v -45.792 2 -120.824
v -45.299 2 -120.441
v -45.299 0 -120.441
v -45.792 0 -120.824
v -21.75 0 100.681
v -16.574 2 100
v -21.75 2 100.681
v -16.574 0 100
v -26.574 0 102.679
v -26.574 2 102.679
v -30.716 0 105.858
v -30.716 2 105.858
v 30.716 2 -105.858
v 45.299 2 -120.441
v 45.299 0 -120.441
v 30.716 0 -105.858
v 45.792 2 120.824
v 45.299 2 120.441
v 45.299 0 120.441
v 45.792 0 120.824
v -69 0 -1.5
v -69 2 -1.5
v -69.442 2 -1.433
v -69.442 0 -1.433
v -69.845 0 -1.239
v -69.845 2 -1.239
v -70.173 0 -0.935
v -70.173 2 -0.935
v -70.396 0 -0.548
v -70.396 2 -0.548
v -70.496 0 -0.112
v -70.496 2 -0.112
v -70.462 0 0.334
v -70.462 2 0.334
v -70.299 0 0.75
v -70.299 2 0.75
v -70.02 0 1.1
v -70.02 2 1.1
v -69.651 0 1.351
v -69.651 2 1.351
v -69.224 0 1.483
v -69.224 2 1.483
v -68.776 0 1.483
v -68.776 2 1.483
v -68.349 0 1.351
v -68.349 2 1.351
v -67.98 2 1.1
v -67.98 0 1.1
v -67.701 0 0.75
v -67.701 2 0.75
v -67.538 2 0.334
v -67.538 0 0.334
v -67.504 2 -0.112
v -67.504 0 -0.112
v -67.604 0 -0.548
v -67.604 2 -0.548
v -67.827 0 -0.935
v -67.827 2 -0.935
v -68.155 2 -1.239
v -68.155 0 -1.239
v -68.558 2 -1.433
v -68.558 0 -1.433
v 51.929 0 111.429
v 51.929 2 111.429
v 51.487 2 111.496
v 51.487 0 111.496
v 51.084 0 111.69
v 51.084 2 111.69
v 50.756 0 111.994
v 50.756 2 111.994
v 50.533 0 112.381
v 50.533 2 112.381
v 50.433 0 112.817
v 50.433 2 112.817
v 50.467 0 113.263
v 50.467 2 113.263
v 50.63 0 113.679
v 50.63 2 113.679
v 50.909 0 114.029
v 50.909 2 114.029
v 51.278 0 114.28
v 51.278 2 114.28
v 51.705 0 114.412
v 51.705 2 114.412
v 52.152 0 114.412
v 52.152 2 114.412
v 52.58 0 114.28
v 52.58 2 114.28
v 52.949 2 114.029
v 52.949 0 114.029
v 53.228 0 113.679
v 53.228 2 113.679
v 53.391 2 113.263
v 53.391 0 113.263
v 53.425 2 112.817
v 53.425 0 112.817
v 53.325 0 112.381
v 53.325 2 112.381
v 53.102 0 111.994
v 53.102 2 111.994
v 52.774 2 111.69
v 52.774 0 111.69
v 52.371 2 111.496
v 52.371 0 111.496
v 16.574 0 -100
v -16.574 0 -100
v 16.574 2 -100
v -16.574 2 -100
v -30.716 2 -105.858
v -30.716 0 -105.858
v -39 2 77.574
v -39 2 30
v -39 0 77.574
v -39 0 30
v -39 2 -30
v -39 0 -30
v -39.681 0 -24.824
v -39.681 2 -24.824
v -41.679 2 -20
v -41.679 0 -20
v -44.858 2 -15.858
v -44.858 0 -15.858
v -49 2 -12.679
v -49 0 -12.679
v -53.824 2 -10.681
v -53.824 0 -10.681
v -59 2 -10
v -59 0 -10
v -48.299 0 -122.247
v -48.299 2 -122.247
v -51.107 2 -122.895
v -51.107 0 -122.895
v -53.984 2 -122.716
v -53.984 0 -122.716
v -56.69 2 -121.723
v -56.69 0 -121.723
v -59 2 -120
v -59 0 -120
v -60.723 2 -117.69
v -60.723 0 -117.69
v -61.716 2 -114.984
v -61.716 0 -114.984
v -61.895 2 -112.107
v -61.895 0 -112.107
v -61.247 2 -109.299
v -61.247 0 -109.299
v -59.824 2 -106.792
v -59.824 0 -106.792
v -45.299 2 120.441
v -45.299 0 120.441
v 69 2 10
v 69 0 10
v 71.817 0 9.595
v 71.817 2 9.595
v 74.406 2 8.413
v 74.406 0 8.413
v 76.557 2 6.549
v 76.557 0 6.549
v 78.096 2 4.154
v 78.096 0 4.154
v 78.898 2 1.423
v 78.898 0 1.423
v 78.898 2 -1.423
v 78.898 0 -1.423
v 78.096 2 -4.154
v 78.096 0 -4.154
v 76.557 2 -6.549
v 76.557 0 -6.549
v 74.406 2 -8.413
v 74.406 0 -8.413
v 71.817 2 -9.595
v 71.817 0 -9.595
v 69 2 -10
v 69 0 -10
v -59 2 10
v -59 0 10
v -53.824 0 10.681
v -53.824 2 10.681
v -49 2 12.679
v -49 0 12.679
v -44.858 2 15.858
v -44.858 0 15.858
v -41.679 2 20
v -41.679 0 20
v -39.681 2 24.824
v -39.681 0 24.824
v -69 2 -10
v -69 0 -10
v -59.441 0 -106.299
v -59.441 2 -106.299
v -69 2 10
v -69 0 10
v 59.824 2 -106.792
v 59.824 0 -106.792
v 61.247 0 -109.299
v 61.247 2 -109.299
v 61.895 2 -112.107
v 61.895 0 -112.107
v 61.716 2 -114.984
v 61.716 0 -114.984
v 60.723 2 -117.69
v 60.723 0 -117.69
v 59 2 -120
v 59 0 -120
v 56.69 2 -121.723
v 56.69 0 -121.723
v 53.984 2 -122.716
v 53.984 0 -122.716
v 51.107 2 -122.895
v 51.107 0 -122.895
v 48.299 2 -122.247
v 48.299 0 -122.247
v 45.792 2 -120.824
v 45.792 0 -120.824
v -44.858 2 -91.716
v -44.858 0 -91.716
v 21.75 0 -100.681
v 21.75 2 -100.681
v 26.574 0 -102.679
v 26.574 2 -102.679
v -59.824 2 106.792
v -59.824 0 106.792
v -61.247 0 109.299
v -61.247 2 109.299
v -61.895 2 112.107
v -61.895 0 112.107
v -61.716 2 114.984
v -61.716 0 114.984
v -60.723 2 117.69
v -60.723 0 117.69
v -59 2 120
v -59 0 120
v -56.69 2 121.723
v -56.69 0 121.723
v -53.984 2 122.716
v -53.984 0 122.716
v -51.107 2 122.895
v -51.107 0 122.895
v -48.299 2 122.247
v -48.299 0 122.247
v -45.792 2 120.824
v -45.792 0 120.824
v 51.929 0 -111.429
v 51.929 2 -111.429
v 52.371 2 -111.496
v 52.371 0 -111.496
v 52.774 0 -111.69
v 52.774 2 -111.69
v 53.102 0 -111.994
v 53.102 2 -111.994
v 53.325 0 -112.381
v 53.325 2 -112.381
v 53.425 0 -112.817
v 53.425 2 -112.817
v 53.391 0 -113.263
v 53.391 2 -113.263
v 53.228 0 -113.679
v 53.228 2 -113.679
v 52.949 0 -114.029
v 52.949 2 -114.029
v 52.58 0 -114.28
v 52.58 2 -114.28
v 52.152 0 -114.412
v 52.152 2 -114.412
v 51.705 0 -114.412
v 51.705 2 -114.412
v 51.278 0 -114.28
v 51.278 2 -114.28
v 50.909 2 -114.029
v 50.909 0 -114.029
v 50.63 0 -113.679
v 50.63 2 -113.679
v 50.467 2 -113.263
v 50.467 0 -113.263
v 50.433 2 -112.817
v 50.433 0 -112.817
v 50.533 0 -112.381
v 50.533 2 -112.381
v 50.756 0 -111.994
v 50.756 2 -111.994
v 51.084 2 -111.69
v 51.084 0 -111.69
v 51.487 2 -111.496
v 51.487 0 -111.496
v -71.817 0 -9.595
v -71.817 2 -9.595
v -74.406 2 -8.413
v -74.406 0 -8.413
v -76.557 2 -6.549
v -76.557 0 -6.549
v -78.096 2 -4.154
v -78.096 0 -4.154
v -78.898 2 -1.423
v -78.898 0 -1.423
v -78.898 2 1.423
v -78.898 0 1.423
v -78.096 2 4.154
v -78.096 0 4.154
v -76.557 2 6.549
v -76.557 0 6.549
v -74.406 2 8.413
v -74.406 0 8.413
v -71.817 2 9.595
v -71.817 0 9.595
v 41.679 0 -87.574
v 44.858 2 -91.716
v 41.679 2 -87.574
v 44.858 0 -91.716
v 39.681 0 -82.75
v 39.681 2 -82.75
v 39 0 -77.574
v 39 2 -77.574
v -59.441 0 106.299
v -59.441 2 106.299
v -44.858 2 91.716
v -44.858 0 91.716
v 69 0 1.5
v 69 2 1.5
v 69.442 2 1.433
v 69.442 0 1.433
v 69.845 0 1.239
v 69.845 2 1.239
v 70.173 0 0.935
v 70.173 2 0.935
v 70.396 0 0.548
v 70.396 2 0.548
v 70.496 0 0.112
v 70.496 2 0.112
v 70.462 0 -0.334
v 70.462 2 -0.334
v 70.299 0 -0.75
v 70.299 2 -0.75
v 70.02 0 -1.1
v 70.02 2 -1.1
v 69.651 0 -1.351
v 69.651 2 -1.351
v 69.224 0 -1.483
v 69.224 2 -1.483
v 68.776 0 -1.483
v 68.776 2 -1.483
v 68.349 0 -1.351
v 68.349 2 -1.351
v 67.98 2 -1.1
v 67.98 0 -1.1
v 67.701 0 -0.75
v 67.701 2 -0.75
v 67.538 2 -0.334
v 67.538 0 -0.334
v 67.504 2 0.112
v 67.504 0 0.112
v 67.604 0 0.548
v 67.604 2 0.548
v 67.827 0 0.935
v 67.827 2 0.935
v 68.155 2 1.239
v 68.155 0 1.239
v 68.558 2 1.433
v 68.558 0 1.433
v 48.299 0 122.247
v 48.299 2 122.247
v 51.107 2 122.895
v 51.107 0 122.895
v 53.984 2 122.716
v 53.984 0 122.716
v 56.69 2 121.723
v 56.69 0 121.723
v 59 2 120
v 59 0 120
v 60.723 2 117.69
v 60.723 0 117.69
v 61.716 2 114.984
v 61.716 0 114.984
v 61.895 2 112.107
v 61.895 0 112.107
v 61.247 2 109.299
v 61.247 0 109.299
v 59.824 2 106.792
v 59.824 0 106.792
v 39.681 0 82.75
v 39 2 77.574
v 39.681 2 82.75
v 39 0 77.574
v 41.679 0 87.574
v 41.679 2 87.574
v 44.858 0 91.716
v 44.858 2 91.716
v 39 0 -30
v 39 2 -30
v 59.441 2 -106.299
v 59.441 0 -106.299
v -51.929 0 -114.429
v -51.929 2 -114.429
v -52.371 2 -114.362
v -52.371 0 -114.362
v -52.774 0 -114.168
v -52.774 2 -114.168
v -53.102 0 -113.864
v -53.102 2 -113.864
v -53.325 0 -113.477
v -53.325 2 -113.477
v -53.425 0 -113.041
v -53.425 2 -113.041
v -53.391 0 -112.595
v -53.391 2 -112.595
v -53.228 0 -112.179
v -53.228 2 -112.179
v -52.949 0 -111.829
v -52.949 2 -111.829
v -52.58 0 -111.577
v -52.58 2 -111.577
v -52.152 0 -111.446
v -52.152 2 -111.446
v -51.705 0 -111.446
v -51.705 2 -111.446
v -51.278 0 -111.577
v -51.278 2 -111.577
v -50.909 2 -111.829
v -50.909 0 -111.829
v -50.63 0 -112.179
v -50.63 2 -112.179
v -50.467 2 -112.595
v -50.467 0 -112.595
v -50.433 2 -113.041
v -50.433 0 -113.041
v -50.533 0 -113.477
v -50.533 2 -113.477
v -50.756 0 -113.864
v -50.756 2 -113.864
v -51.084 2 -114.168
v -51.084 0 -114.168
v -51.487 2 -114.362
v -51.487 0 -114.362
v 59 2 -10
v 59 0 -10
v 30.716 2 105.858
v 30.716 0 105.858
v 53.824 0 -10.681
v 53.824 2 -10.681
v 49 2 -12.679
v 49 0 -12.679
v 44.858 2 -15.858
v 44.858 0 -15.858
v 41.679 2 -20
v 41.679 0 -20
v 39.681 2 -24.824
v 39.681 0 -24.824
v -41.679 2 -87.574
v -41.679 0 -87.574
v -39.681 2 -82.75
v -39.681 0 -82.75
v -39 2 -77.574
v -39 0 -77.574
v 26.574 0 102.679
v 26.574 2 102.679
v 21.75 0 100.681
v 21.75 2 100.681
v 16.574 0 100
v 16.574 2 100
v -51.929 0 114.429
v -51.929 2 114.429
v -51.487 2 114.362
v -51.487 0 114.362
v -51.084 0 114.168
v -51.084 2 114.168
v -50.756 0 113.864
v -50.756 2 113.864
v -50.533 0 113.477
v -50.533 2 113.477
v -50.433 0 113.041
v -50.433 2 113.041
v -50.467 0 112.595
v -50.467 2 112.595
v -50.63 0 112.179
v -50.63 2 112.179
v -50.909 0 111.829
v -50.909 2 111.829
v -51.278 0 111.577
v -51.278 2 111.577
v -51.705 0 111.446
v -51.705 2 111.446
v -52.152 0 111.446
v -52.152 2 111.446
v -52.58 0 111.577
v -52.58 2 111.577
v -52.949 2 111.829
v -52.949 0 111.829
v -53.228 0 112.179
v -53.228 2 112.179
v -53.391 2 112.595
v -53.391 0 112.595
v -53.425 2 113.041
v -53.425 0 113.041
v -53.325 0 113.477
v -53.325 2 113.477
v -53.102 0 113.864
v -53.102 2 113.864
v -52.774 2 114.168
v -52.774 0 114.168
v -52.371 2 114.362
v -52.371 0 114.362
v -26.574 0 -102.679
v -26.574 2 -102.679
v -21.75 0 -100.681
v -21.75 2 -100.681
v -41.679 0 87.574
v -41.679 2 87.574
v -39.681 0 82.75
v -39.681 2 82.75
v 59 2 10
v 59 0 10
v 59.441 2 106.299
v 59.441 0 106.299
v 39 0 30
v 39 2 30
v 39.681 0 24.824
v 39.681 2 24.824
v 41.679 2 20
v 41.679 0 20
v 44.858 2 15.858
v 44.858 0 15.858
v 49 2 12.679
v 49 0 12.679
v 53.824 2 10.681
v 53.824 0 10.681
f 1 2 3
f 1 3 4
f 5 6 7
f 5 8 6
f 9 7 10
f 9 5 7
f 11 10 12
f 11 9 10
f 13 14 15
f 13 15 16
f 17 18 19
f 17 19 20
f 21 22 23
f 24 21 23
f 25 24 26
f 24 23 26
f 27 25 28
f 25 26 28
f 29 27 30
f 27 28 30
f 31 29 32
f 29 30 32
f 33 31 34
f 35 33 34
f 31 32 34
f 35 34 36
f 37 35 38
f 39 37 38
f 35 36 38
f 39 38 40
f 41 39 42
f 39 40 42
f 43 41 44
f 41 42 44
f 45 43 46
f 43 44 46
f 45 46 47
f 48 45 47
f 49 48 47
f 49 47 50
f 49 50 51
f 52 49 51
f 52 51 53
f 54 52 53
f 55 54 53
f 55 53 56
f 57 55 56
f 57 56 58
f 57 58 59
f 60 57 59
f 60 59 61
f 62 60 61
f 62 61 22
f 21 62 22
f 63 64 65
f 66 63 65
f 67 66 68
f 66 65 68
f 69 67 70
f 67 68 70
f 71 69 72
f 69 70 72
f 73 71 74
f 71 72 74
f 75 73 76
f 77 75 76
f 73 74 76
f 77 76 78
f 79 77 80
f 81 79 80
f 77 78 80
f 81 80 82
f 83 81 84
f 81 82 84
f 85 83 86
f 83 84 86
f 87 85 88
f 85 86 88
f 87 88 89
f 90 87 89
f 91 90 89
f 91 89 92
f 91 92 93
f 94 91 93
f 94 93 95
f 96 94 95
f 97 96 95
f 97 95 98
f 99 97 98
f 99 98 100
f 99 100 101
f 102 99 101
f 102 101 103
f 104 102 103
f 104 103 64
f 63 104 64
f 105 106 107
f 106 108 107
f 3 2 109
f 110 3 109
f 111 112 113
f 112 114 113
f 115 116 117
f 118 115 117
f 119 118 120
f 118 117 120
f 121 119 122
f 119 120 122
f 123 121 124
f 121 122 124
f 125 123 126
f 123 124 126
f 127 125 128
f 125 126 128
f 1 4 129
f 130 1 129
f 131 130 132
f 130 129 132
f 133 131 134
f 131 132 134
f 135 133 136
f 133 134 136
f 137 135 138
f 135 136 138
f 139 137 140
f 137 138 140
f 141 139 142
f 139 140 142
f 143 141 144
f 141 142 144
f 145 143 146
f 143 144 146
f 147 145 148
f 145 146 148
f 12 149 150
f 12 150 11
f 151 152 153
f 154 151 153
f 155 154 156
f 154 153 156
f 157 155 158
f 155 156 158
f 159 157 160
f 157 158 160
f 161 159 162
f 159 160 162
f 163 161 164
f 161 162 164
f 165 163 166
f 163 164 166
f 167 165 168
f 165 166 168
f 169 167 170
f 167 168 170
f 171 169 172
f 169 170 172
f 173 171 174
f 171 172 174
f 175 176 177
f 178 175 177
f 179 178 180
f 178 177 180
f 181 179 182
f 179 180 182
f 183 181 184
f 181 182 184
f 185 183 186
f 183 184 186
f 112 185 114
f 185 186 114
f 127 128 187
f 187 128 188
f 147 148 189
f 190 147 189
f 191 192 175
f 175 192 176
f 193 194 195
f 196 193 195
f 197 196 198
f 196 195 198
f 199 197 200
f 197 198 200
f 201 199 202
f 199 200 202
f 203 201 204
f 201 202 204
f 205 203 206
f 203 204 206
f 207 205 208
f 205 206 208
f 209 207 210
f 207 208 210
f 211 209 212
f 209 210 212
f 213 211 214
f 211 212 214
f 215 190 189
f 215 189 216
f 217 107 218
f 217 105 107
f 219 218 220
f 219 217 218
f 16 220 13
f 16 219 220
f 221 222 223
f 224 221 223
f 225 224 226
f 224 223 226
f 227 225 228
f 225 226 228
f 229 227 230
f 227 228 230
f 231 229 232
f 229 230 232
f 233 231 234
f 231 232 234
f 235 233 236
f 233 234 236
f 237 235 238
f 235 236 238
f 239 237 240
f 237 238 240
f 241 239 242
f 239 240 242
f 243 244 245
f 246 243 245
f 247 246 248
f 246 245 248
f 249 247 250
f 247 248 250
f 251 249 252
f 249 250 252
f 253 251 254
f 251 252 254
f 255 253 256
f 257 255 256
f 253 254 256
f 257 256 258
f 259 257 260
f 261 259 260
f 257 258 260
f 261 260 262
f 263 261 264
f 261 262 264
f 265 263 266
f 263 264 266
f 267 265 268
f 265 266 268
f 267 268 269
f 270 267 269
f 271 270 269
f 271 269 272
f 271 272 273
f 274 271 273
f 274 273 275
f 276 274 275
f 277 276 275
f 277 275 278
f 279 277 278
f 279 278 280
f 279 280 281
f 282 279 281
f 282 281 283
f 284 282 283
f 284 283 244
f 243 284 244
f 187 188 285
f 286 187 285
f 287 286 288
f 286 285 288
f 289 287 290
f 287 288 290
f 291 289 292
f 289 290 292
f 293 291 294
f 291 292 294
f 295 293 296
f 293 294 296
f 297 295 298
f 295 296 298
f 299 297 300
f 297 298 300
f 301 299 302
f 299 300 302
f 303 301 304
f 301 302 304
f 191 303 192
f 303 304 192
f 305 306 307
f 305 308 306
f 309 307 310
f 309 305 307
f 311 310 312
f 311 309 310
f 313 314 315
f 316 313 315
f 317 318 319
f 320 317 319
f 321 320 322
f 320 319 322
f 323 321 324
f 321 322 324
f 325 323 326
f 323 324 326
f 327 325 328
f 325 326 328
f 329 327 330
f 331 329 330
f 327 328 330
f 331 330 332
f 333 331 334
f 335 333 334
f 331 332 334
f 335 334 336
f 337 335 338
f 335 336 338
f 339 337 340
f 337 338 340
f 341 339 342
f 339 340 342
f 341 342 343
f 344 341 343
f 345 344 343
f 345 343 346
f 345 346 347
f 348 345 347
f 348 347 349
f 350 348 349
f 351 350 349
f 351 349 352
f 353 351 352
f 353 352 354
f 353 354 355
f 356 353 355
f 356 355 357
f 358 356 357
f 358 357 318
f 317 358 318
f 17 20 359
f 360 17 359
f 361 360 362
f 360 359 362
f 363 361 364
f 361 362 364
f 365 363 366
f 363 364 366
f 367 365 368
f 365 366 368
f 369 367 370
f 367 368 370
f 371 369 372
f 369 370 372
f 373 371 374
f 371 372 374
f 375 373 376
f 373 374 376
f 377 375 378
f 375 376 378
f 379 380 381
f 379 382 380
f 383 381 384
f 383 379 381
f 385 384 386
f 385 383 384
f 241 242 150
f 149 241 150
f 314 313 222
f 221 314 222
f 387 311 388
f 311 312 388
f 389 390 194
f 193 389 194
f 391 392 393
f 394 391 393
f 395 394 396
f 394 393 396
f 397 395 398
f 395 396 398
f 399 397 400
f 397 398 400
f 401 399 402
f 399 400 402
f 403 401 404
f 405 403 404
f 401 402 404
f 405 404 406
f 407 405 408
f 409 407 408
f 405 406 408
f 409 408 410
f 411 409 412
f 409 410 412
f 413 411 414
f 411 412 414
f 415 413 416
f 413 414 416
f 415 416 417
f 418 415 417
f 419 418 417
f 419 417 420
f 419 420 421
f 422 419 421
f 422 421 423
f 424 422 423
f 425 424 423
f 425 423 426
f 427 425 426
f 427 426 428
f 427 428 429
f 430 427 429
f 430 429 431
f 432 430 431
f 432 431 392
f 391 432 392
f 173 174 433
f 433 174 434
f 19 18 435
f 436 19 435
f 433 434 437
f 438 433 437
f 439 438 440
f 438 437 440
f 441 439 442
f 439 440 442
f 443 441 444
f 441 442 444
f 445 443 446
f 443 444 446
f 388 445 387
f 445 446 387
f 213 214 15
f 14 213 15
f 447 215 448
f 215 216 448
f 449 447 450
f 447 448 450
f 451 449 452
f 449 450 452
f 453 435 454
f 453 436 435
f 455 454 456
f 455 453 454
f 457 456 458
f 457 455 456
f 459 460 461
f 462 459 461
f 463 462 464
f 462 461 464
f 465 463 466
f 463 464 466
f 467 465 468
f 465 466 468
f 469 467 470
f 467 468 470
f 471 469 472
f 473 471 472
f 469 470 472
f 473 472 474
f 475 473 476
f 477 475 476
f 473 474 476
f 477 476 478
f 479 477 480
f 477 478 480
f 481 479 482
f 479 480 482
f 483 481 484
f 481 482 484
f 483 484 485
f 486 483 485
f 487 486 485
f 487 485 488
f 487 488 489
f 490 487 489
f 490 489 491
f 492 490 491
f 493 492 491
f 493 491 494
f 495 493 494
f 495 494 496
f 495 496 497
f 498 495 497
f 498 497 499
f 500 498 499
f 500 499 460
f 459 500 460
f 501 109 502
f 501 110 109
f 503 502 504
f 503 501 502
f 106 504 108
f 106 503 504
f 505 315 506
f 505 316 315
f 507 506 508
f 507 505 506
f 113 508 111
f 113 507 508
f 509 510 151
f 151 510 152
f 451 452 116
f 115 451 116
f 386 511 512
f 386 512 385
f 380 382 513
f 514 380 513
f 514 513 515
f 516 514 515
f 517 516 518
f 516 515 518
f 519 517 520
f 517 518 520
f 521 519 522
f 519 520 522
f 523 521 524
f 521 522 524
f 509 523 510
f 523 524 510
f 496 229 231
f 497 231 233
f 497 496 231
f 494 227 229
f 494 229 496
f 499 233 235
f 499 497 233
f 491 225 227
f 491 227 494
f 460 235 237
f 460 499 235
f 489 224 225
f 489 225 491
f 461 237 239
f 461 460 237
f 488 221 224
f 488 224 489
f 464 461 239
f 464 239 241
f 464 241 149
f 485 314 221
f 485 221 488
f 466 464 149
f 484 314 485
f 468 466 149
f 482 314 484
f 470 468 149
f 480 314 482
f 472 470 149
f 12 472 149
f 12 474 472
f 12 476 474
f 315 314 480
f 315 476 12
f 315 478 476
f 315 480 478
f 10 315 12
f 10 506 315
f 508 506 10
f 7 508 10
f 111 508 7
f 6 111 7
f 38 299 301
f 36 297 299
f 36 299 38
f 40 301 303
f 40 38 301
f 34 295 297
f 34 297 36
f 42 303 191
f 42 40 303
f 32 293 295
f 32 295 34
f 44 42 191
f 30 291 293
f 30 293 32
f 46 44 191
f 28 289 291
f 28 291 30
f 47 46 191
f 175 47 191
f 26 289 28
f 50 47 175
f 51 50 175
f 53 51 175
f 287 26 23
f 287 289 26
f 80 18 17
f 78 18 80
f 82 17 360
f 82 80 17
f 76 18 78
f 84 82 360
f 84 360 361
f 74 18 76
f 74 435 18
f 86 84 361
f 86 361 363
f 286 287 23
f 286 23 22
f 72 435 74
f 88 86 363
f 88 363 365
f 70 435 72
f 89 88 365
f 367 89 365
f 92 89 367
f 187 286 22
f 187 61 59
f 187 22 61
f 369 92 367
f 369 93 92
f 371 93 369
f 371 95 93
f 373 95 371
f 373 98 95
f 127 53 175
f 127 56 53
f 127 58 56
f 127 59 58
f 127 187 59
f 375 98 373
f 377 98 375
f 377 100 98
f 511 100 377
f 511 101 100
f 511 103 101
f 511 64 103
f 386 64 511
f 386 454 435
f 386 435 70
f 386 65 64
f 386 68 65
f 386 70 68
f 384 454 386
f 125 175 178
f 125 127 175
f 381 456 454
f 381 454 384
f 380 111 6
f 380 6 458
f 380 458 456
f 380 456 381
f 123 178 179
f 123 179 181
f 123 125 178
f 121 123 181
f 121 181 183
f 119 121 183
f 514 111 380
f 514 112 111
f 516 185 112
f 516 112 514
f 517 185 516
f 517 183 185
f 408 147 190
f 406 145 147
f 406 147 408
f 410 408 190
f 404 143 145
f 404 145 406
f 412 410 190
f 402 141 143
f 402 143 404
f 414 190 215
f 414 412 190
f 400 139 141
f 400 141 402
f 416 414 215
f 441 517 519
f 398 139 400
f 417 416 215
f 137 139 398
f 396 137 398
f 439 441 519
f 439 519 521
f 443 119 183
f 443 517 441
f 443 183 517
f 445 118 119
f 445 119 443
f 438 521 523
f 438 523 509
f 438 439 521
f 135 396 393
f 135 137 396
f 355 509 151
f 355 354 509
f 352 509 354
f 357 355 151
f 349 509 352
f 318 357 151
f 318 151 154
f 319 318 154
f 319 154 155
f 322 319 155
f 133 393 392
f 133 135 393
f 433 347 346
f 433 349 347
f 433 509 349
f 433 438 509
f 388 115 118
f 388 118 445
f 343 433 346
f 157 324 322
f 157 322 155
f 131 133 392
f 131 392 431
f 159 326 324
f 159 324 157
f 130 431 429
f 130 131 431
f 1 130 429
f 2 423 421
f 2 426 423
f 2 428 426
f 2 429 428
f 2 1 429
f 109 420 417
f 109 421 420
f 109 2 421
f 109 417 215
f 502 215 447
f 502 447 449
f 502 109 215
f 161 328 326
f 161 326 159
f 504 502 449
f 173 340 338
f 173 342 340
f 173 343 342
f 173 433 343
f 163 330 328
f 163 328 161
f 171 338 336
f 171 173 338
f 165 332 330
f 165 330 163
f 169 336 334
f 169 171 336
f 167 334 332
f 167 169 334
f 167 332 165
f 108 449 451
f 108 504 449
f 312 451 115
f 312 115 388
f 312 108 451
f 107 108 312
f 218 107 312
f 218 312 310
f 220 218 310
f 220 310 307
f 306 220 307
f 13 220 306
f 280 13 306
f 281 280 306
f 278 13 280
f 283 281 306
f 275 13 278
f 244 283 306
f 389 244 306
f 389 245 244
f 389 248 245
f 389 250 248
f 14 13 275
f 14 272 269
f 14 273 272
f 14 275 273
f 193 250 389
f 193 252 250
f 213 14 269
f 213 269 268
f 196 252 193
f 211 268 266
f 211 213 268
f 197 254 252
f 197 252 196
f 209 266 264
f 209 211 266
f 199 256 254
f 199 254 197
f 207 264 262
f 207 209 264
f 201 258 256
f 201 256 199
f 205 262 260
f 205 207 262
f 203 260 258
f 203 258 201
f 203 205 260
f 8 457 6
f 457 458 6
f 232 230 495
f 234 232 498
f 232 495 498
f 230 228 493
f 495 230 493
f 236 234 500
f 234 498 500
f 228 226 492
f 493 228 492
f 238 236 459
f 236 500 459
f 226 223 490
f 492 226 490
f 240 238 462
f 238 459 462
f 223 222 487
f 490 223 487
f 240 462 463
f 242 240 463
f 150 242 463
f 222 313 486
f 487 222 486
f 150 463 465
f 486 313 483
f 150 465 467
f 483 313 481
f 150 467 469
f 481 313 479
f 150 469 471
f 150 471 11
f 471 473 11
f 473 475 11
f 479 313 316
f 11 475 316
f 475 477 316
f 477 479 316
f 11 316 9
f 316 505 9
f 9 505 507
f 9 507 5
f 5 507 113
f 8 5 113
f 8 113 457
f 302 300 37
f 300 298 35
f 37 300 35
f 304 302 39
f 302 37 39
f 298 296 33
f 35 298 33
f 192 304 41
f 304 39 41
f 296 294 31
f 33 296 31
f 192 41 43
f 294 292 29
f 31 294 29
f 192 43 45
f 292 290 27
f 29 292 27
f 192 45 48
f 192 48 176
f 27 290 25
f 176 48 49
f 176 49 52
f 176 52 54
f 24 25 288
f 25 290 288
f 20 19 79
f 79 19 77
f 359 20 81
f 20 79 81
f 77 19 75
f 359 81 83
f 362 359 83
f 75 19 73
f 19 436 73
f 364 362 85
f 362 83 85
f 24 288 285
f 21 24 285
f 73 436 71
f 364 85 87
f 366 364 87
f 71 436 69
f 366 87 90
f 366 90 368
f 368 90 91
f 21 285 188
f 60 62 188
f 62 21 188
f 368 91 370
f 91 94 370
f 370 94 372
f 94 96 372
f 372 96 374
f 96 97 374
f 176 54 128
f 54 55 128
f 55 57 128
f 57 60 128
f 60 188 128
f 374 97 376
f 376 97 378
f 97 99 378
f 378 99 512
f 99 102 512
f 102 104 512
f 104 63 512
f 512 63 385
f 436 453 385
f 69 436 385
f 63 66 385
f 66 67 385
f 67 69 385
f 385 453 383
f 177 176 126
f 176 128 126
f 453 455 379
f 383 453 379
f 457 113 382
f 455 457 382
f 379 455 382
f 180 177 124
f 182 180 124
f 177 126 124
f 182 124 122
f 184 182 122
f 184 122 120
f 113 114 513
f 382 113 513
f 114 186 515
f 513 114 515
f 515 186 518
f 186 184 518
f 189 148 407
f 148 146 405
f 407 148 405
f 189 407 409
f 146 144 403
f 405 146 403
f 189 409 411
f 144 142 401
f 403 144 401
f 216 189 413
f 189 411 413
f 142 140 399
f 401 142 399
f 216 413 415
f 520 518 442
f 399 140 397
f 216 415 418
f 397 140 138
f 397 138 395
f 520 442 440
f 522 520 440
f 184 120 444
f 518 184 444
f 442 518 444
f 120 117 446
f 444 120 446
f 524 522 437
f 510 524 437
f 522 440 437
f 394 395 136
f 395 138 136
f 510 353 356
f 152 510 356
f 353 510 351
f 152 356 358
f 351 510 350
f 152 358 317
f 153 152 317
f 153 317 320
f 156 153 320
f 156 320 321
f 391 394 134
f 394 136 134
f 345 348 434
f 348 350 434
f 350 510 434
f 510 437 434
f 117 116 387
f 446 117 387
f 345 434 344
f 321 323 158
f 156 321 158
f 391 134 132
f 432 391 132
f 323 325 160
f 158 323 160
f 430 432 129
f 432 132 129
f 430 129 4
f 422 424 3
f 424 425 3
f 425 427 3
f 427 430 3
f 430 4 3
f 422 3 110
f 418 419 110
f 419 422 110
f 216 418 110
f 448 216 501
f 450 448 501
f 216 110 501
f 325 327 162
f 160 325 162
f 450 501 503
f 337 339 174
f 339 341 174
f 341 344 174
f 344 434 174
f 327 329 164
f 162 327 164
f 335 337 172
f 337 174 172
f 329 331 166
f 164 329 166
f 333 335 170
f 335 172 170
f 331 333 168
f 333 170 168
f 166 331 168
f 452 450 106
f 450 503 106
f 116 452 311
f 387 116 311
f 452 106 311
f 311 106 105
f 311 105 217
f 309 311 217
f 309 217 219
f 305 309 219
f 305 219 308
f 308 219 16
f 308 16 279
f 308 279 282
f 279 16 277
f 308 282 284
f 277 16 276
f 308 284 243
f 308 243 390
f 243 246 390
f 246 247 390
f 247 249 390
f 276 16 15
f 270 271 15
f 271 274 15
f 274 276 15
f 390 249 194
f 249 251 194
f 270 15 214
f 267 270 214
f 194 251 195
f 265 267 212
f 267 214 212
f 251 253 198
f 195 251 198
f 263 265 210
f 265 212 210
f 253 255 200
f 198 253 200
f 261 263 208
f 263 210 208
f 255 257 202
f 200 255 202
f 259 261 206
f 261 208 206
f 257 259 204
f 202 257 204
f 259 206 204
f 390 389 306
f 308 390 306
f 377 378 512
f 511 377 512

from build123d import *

# Parameters (mm, degrees)
EXTRUDE_1_DEPTH       = 2
CUT_EXTRUDE_1_DEPTH   = 147.138709345
MIRROR_2_COPY_1_DEPTH = 147.138709345
FILLET_1_R            = 20
SKETCH_4_R            = 1.5
CUT_EXTRUDE_2_DEPTH   = 147.138709345


with BuildPart() as part:
    # 草图2 → 凸台-拉伸1 (new body)
    with BuildSketch(Plane(origin=(0, 0, 0), x_dir=(1, 0, 0), z_dir=(0, 1, 0))):
        with BuildLine():
            Line((-69, -10), (-59, -10))
            ThreePointArc((-59, -10), (-44.857864376, -15.857864376), (-39, -30))
            Line((-39, -30), (-39, -73.141444367))
            ThreePointArc((-39, -73.141444367), (-40.081491111, -79.629126652), (-43.209002143, -85.415171865))
            Line((-43.209002143, -85.415171865), (-59.824431116, -106.792068439))
            ThreePointArc((-59.824431116, -106.792068439), (-59, -120), (-45.792068439, -120.824431116))
            Line((-45.792068439, -120.824431116), (-24.415171865, -104.209002143))
            ThreePointArc((-24.415171865, -104.209002143), (-18.629126652, -101.081491111), (-12.141444367, -100))
            Line((-12.141444367, -100), (12.141444367, -100))
            ThreePointArc((12.141444367, -100), (18.629126652, -101.081491111), (24.415171865, -104.209002143))
            Line((24.415171865, -104.209002143), (45.792068439, -120.824431116))
            ThreePointArc((45.792068439, -120.824431116), (59, -120), (59.824431116, -106.792068439))
            Line((59.824431116, -106.792068439), (43.209002143, -85.415171865))
            ThreePointArc((43.209002143, -85.415171865), (40.081491111, -79.629126652), (39, -73.141444367))
            Line((39, -73.141444367), (39, -30))
            ThreePointArc((39, -30), (44.857864376, -15.857864376), (59, -10))
            Line((59, -10), (69, -10))
            ThreePointArc((69, -10), (79, 0), (69, 10))
            Line((69, 10), (59, 10))
            ThreePointArc((59, 10), (44.857864376, 15.857864376), (39, 30))
            Line((39, 30), (39, 73.141444367))
            ThreePointArc((39, 73.141444367), (40.081491111, 79.629126652), (43.209002143, 85.415171865))
            Line((43.209002143, 85.415171865), (59.824431116, 106.792068439))
            ThreePointArc((59.824431116, 106.792068439), (59, 120), (45.792068439, 120.824431116))
            Line((45.792068439, 120.824431116), (24.415171865, 104.209002143))
            ThreePointArc((24.415171865, 104.209002143), (18.629126652, 101.081491111), (12.141444367, 100))
            Line((12.141444367, 100), (-12.141444367, 100))
            ThreePointArc((-12.141444367, 100), (-18.629126652, 101.081491111), (-24.415171865, 104.209002143))
            Line((-24.415171865, 104.209002143), (-45.792068439, 120.824431116))
            ThreePointArc((-45.792068439, 120.824431116), (-59, 120), (-59.824431116, 106.792068439))
            Line((-59.824431116, 106.792068439), (-43.209002143, 85.415171865))
            ThreePointArc((-43.209002143, 85.415171865), (-40.081491111, 79.629126652), (-39, 73.141444367))
            Line((-39, 73.141444367), (-39, 30))
            ThreePointArc((-39, 30), (-44.857864376, 15.857864376), (-59, 10))
            Line((-59, 10), (-69, 10))
            ThreePointArc((-69, 10), (-79, 0), (-69, -10))
        make_face()
    extrude(amount=EXTRUDE_1_DEPTH)

    # 草图3 → 切除-拉伸1 (cut, through all)
    with BuildSketch(Plane(origin=(0, 2, 0), x_dir=(1, 0, 0), z_dir=(0, 1, 0))):
        Polygon((24.857864376, 100), (12.141444367, 100), (45.299236161, 120.441371785), align=None)
        Polygon((39, 73.141444367), (59.441371785, 106.299236161), (39, 85.857864376), align=None)
    cut_extrude_1 = extrude(amount=-CUT_EXTRUDE_1_DEPTH, mode=Mode.SUBTRACT)

    # 镜向1: 切除-拉伸1 across plane
    add(cut_extrude_1.mirror(Plane.XY), mode=Mode.SUBTRACT)

    # 镜向2: 切除-拉伸1 across plane
    add(cut_extrude_1.mirror(Plane(origin=(0, 0, 0), x_dir=(0, 0, 1), z_dir=(1, 0, 0))), mode=Mode.SUBTRACT)

    # 镜向2 copy 1 sketch → 镜向2 copy 1 (cut, through all)
    with BuildSketch(Plane(origin=(0, 2, 0), x_dir=(-1, 0, 0), z_dir=(0, 1, 0))):
        Polygon((24.857864376, 100), (12.141444367, 100), (45.299236161, 120.441371785), align=None)
        Polygon((39, 73.141444367), (59.441371785, 106.299236161), (39, 85.857864376), align=None)
    extrude(amount=-MIRROR_2_COPY_1_DEPTH, mode=Mode.SUBTRACT)

    # 圆角1
    fillet_1_edges = [part.edges().sort_by_distance(p)[0] for p in [
        (39, 1, -85.857864376),
        (24.857864376, 1, -100),
        (39, 1, 85.857864376),
        (24.857864376, 1, 100),
        (-39, 1, -85.857864376),
        (-24.857864376, 1, -100),
        (-39, 1, 85.857864376),
        (-24.857864376, 1, 100),
    ]]
    fillet(fillet_1_edges, radius=FILLET_1_R)

    # 草图4 → 切除-拉伸2 (cut, through all)
    with BuildSketch(Plane(origin=(0, 2, 0), x_dir=(1, 0, 0), z_dir=(0, 1, 0))):
        with Locations(Location((69, 0, 0), (0, 0, 270))):
            Circle(SKETCH_4_R)
        with Locations(Location((51.928932188, 112.928932188, 0), (0, 0, 270))):
            Circle(SKETCH_4_R)
        with Locations(Location((51.928932188, -112.928932188, 0), (0, 0, 90))):
            Circle(SKETCH_4_R)
        with Locations(Location((-69, 0, 0), (0, 0, 90))):
            Circle(SKETCH_4_R)
        with Locations(Location((-51.928932188, 112.928932188, 0), (0, 0, 90))):
            Circle(SKETCH_4_R)
        with Locations(Location((-51.928932188, -112.928932188, 0), (0, 0, 270))):
            Circle(SKETCH_4_R)
    extrude(amount=-CUT_EXTRUDE_2_DEPTH, mode=Mode.SUBTRACT)


solid = part.part
